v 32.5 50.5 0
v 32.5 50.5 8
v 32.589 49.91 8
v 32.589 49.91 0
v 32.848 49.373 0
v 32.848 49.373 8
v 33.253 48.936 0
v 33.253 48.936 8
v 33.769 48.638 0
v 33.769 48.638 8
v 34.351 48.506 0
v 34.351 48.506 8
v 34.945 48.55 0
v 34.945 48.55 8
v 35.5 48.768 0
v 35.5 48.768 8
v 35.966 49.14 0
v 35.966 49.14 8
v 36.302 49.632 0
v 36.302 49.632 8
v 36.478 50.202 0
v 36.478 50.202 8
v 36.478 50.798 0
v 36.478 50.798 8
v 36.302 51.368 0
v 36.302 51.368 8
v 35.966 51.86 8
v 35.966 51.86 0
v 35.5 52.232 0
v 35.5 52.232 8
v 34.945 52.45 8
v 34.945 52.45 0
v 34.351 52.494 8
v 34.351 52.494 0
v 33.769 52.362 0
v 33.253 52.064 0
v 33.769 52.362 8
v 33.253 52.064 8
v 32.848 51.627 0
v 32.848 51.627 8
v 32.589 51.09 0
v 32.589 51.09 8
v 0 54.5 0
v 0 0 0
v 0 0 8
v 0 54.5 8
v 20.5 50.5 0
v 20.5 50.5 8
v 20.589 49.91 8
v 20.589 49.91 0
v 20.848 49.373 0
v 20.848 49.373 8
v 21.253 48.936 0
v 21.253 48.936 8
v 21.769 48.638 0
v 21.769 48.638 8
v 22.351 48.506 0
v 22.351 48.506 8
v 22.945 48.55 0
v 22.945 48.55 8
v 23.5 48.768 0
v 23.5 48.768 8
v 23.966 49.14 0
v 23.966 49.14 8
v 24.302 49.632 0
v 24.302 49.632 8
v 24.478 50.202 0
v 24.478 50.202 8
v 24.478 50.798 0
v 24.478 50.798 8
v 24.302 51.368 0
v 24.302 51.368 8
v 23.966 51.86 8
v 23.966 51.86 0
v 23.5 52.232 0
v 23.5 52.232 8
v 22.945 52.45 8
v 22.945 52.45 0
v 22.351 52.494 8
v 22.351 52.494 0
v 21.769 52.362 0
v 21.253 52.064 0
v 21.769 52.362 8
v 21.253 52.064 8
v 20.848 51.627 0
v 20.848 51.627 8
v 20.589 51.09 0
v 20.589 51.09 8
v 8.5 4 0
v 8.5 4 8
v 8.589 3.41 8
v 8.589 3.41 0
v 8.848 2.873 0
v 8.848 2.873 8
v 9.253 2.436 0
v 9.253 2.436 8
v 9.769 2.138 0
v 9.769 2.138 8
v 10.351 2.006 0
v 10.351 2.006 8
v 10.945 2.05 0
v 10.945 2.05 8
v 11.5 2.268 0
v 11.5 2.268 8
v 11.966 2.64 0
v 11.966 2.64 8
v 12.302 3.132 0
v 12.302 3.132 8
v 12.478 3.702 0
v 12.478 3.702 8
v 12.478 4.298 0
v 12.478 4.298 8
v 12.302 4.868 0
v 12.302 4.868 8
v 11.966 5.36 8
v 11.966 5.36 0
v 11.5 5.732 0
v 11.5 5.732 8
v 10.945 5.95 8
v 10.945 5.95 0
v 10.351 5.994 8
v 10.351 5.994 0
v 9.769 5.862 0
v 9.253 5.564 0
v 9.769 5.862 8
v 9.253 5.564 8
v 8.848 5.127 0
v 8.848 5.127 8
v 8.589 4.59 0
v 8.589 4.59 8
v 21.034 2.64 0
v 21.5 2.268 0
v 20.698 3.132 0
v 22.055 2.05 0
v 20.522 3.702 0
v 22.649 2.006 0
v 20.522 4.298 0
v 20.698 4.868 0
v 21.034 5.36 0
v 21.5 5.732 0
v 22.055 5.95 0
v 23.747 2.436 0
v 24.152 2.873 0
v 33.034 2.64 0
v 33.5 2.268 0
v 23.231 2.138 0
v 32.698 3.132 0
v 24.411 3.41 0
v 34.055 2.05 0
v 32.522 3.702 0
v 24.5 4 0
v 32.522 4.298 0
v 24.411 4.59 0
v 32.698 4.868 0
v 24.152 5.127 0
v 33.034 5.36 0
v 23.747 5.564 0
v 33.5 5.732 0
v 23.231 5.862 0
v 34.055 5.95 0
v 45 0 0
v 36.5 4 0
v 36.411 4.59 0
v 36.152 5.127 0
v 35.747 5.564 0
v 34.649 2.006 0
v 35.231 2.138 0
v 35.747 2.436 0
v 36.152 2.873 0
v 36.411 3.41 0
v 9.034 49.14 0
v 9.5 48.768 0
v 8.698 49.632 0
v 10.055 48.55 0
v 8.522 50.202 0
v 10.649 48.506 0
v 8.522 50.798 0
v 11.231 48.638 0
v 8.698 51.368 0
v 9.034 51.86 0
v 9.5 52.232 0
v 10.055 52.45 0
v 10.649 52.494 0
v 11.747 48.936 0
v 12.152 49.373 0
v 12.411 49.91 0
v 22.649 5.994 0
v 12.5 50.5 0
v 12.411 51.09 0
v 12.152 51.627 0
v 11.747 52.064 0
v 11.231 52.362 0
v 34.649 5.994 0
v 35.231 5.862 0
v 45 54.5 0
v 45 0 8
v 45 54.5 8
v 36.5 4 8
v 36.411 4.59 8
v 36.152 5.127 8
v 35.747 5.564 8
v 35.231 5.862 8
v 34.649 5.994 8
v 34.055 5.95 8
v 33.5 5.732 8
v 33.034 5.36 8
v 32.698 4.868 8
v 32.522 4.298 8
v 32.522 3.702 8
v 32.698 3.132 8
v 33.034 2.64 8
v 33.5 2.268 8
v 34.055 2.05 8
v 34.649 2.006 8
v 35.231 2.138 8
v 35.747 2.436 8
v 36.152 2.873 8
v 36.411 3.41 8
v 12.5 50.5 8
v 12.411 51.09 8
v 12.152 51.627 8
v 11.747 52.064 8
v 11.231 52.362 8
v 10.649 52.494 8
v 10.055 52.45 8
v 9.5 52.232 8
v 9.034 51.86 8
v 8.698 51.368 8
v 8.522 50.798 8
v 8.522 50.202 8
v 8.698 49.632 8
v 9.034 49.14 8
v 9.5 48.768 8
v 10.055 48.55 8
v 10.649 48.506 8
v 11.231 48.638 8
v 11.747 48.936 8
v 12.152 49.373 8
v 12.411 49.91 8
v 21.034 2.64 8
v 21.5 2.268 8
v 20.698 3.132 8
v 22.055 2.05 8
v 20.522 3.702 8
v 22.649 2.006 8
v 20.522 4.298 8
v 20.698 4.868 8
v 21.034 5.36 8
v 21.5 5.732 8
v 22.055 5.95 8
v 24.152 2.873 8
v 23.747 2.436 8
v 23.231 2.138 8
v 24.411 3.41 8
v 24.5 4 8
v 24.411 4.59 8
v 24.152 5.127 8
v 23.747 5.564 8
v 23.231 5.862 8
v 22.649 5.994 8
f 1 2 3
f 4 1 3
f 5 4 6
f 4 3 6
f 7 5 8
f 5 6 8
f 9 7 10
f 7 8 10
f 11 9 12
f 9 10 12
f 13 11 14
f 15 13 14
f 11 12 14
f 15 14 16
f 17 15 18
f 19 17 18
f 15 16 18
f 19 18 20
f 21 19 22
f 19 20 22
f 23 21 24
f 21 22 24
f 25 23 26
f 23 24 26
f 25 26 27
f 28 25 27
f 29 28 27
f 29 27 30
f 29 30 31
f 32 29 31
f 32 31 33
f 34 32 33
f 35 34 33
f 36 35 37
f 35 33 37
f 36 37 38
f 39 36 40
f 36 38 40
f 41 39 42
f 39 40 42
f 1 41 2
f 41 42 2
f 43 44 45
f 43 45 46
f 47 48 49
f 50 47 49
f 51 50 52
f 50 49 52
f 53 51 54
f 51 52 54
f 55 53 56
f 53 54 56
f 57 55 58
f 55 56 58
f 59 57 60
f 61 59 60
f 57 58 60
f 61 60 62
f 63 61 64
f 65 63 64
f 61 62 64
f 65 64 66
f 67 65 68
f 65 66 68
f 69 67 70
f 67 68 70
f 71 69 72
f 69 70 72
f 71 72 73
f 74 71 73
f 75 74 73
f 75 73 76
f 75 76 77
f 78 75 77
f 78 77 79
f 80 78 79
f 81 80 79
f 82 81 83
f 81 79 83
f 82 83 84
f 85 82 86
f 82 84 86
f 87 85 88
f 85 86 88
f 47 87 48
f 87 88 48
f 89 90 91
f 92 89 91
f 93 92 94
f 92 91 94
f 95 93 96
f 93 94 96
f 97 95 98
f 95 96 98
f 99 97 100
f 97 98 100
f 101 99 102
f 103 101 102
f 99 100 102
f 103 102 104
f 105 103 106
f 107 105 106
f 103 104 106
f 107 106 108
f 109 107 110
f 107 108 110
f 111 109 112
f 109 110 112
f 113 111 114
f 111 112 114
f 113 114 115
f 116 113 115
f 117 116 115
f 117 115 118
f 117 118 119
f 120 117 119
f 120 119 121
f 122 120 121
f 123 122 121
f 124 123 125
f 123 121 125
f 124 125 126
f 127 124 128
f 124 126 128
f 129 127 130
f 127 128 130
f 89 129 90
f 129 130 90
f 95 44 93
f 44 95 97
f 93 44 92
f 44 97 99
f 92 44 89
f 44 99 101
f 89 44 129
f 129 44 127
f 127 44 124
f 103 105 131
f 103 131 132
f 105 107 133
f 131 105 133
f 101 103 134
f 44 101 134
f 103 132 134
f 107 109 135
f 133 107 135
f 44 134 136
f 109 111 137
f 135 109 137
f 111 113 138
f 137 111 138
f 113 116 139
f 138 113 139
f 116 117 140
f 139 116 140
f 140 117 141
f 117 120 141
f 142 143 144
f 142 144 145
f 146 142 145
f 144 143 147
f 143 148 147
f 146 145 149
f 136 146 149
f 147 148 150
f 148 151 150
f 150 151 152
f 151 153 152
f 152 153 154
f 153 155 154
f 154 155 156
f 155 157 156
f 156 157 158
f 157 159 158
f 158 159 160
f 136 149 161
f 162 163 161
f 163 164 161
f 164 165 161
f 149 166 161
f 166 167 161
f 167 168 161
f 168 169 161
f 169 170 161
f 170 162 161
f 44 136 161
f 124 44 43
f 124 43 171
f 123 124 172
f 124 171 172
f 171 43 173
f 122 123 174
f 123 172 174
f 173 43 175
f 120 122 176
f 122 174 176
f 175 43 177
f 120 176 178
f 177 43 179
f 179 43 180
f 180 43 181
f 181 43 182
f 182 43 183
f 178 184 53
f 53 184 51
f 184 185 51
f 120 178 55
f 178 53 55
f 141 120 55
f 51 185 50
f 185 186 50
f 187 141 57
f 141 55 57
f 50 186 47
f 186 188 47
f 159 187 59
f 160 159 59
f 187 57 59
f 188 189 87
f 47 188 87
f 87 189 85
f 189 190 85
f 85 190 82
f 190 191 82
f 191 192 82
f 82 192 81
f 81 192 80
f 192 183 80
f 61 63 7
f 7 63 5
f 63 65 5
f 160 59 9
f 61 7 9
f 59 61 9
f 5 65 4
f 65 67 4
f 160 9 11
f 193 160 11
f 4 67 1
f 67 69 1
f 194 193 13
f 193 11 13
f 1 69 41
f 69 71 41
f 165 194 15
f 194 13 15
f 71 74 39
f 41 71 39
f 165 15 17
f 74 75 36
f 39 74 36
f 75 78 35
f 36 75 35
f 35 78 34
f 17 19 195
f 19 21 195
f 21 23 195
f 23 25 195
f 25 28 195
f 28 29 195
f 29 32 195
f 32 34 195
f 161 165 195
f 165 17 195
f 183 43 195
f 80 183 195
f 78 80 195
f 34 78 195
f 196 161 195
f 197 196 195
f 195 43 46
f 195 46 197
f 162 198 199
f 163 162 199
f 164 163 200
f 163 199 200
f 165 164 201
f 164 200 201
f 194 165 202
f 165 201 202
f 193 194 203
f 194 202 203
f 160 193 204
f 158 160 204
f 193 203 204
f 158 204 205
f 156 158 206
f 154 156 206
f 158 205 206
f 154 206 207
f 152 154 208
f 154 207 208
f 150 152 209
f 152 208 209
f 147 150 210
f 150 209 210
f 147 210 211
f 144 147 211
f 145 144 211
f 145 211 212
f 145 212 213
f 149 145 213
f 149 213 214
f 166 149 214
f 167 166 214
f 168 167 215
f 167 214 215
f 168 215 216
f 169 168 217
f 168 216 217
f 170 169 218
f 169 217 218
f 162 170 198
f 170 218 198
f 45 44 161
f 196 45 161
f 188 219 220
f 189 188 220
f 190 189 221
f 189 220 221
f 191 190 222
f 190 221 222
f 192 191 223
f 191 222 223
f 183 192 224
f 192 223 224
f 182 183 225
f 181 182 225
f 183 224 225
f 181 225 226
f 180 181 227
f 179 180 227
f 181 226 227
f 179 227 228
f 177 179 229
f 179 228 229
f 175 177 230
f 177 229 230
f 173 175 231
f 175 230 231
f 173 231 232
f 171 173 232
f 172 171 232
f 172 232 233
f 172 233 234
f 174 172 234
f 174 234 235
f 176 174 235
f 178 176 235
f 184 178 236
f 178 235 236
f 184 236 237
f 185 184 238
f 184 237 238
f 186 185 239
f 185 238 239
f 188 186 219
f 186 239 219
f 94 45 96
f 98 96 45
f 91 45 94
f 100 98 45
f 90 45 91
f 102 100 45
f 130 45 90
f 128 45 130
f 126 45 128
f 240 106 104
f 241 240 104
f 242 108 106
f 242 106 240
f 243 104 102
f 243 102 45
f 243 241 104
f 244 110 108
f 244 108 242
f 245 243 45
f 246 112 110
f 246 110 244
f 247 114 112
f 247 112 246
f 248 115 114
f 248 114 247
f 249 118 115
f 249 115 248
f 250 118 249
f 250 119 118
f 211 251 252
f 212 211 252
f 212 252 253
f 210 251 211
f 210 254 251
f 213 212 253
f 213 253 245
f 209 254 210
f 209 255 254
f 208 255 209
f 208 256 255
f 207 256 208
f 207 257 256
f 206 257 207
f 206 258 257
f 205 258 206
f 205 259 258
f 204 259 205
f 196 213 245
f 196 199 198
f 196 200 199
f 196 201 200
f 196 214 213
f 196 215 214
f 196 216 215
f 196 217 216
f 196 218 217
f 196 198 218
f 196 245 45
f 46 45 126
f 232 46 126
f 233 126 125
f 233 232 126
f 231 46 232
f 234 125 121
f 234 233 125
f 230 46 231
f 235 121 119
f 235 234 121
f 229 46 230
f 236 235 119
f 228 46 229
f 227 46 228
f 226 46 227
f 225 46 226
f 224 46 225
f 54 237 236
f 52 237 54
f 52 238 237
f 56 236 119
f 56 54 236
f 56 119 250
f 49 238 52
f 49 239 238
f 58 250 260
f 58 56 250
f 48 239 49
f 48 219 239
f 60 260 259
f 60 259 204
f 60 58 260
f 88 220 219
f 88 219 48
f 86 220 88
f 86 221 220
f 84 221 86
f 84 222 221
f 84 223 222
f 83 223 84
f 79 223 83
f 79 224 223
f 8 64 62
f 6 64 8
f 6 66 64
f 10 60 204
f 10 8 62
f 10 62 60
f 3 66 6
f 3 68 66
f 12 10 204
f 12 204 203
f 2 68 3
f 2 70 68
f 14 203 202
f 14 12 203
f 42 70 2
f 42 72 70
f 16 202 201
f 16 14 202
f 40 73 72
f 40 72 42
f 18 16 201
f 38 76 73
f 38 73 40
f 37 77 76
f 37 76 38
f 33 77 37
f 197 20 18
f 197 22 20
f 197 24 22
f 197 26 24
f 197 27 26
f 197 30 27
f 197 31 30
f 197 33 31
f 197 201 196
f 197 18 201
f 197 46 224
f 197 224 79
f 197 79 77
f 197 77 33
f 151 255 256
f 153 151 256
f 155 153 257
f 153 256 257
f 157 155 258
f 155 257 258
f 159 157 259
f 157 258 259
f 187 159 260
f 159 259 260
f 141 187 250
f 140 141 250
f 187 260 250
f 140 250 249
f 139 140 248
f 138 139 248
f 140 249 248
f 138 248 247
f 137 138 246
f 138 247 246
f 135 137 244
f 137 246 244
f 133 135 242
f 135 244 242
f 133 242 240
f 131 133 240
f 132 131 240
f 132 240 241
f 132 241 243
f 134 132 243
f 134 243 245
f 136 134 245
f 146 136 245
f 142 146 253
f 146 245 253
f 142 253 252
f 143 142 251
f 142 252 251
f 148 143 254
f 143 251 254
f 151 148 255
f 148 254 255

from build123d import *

# Parameters (mm, degrees)
ESQUISSE1_W             = 45
ESQUISSE1_H             = 54.5
BOSS_EXTRU_1_DEPTH      = 8
ESQUISSE2_R             = 2
ENL_V_MAT_EXTRU_1_DEPTH = 8


with BuildPart() as part:
    # Esquisse1 → Boss.-Extru.1 (new body)
    with BuildSketch(Plane.XY):
        with Locations((22.5, 27.25)):
            Rectangle(ESQUISSE1_W, ESQUISSE1_H)
    extrude(amount=BOSS_EXTRU_1_DEPTH)

    # Esquisse2 → Enlèv. mat.-Extru.1 (cut)
    with BuildSketch(Plane.XY.offset(8)):
        with Locations(Location((10.5, 4, 0), (0, 0, 180))):
            Circle(ESQUISSE2_R)
        with Locations((34.5, 4)):
            Circle(ESQUISSE2_R)
        with Locations((22.5, 4)):
            Circle(ESQUISSE2_R)
        with Locations(Location((22.5, 50.5, 0), (0, 0, 180))):
            Circle(ESQUISSE2_R)
        with Locations(Location((34.5, 50.5, 0), (0, 0, 180))):
            Circle(ESQUISSE2_R)
        with Locations((10.5, 50.5)):
            Circle(ESQUISSE2_R)
    extrude(amount=-ENL_V_MAT_EXTRU_1_DEPTH, mode=Mode.SUBTRACT)


solid = part.part
